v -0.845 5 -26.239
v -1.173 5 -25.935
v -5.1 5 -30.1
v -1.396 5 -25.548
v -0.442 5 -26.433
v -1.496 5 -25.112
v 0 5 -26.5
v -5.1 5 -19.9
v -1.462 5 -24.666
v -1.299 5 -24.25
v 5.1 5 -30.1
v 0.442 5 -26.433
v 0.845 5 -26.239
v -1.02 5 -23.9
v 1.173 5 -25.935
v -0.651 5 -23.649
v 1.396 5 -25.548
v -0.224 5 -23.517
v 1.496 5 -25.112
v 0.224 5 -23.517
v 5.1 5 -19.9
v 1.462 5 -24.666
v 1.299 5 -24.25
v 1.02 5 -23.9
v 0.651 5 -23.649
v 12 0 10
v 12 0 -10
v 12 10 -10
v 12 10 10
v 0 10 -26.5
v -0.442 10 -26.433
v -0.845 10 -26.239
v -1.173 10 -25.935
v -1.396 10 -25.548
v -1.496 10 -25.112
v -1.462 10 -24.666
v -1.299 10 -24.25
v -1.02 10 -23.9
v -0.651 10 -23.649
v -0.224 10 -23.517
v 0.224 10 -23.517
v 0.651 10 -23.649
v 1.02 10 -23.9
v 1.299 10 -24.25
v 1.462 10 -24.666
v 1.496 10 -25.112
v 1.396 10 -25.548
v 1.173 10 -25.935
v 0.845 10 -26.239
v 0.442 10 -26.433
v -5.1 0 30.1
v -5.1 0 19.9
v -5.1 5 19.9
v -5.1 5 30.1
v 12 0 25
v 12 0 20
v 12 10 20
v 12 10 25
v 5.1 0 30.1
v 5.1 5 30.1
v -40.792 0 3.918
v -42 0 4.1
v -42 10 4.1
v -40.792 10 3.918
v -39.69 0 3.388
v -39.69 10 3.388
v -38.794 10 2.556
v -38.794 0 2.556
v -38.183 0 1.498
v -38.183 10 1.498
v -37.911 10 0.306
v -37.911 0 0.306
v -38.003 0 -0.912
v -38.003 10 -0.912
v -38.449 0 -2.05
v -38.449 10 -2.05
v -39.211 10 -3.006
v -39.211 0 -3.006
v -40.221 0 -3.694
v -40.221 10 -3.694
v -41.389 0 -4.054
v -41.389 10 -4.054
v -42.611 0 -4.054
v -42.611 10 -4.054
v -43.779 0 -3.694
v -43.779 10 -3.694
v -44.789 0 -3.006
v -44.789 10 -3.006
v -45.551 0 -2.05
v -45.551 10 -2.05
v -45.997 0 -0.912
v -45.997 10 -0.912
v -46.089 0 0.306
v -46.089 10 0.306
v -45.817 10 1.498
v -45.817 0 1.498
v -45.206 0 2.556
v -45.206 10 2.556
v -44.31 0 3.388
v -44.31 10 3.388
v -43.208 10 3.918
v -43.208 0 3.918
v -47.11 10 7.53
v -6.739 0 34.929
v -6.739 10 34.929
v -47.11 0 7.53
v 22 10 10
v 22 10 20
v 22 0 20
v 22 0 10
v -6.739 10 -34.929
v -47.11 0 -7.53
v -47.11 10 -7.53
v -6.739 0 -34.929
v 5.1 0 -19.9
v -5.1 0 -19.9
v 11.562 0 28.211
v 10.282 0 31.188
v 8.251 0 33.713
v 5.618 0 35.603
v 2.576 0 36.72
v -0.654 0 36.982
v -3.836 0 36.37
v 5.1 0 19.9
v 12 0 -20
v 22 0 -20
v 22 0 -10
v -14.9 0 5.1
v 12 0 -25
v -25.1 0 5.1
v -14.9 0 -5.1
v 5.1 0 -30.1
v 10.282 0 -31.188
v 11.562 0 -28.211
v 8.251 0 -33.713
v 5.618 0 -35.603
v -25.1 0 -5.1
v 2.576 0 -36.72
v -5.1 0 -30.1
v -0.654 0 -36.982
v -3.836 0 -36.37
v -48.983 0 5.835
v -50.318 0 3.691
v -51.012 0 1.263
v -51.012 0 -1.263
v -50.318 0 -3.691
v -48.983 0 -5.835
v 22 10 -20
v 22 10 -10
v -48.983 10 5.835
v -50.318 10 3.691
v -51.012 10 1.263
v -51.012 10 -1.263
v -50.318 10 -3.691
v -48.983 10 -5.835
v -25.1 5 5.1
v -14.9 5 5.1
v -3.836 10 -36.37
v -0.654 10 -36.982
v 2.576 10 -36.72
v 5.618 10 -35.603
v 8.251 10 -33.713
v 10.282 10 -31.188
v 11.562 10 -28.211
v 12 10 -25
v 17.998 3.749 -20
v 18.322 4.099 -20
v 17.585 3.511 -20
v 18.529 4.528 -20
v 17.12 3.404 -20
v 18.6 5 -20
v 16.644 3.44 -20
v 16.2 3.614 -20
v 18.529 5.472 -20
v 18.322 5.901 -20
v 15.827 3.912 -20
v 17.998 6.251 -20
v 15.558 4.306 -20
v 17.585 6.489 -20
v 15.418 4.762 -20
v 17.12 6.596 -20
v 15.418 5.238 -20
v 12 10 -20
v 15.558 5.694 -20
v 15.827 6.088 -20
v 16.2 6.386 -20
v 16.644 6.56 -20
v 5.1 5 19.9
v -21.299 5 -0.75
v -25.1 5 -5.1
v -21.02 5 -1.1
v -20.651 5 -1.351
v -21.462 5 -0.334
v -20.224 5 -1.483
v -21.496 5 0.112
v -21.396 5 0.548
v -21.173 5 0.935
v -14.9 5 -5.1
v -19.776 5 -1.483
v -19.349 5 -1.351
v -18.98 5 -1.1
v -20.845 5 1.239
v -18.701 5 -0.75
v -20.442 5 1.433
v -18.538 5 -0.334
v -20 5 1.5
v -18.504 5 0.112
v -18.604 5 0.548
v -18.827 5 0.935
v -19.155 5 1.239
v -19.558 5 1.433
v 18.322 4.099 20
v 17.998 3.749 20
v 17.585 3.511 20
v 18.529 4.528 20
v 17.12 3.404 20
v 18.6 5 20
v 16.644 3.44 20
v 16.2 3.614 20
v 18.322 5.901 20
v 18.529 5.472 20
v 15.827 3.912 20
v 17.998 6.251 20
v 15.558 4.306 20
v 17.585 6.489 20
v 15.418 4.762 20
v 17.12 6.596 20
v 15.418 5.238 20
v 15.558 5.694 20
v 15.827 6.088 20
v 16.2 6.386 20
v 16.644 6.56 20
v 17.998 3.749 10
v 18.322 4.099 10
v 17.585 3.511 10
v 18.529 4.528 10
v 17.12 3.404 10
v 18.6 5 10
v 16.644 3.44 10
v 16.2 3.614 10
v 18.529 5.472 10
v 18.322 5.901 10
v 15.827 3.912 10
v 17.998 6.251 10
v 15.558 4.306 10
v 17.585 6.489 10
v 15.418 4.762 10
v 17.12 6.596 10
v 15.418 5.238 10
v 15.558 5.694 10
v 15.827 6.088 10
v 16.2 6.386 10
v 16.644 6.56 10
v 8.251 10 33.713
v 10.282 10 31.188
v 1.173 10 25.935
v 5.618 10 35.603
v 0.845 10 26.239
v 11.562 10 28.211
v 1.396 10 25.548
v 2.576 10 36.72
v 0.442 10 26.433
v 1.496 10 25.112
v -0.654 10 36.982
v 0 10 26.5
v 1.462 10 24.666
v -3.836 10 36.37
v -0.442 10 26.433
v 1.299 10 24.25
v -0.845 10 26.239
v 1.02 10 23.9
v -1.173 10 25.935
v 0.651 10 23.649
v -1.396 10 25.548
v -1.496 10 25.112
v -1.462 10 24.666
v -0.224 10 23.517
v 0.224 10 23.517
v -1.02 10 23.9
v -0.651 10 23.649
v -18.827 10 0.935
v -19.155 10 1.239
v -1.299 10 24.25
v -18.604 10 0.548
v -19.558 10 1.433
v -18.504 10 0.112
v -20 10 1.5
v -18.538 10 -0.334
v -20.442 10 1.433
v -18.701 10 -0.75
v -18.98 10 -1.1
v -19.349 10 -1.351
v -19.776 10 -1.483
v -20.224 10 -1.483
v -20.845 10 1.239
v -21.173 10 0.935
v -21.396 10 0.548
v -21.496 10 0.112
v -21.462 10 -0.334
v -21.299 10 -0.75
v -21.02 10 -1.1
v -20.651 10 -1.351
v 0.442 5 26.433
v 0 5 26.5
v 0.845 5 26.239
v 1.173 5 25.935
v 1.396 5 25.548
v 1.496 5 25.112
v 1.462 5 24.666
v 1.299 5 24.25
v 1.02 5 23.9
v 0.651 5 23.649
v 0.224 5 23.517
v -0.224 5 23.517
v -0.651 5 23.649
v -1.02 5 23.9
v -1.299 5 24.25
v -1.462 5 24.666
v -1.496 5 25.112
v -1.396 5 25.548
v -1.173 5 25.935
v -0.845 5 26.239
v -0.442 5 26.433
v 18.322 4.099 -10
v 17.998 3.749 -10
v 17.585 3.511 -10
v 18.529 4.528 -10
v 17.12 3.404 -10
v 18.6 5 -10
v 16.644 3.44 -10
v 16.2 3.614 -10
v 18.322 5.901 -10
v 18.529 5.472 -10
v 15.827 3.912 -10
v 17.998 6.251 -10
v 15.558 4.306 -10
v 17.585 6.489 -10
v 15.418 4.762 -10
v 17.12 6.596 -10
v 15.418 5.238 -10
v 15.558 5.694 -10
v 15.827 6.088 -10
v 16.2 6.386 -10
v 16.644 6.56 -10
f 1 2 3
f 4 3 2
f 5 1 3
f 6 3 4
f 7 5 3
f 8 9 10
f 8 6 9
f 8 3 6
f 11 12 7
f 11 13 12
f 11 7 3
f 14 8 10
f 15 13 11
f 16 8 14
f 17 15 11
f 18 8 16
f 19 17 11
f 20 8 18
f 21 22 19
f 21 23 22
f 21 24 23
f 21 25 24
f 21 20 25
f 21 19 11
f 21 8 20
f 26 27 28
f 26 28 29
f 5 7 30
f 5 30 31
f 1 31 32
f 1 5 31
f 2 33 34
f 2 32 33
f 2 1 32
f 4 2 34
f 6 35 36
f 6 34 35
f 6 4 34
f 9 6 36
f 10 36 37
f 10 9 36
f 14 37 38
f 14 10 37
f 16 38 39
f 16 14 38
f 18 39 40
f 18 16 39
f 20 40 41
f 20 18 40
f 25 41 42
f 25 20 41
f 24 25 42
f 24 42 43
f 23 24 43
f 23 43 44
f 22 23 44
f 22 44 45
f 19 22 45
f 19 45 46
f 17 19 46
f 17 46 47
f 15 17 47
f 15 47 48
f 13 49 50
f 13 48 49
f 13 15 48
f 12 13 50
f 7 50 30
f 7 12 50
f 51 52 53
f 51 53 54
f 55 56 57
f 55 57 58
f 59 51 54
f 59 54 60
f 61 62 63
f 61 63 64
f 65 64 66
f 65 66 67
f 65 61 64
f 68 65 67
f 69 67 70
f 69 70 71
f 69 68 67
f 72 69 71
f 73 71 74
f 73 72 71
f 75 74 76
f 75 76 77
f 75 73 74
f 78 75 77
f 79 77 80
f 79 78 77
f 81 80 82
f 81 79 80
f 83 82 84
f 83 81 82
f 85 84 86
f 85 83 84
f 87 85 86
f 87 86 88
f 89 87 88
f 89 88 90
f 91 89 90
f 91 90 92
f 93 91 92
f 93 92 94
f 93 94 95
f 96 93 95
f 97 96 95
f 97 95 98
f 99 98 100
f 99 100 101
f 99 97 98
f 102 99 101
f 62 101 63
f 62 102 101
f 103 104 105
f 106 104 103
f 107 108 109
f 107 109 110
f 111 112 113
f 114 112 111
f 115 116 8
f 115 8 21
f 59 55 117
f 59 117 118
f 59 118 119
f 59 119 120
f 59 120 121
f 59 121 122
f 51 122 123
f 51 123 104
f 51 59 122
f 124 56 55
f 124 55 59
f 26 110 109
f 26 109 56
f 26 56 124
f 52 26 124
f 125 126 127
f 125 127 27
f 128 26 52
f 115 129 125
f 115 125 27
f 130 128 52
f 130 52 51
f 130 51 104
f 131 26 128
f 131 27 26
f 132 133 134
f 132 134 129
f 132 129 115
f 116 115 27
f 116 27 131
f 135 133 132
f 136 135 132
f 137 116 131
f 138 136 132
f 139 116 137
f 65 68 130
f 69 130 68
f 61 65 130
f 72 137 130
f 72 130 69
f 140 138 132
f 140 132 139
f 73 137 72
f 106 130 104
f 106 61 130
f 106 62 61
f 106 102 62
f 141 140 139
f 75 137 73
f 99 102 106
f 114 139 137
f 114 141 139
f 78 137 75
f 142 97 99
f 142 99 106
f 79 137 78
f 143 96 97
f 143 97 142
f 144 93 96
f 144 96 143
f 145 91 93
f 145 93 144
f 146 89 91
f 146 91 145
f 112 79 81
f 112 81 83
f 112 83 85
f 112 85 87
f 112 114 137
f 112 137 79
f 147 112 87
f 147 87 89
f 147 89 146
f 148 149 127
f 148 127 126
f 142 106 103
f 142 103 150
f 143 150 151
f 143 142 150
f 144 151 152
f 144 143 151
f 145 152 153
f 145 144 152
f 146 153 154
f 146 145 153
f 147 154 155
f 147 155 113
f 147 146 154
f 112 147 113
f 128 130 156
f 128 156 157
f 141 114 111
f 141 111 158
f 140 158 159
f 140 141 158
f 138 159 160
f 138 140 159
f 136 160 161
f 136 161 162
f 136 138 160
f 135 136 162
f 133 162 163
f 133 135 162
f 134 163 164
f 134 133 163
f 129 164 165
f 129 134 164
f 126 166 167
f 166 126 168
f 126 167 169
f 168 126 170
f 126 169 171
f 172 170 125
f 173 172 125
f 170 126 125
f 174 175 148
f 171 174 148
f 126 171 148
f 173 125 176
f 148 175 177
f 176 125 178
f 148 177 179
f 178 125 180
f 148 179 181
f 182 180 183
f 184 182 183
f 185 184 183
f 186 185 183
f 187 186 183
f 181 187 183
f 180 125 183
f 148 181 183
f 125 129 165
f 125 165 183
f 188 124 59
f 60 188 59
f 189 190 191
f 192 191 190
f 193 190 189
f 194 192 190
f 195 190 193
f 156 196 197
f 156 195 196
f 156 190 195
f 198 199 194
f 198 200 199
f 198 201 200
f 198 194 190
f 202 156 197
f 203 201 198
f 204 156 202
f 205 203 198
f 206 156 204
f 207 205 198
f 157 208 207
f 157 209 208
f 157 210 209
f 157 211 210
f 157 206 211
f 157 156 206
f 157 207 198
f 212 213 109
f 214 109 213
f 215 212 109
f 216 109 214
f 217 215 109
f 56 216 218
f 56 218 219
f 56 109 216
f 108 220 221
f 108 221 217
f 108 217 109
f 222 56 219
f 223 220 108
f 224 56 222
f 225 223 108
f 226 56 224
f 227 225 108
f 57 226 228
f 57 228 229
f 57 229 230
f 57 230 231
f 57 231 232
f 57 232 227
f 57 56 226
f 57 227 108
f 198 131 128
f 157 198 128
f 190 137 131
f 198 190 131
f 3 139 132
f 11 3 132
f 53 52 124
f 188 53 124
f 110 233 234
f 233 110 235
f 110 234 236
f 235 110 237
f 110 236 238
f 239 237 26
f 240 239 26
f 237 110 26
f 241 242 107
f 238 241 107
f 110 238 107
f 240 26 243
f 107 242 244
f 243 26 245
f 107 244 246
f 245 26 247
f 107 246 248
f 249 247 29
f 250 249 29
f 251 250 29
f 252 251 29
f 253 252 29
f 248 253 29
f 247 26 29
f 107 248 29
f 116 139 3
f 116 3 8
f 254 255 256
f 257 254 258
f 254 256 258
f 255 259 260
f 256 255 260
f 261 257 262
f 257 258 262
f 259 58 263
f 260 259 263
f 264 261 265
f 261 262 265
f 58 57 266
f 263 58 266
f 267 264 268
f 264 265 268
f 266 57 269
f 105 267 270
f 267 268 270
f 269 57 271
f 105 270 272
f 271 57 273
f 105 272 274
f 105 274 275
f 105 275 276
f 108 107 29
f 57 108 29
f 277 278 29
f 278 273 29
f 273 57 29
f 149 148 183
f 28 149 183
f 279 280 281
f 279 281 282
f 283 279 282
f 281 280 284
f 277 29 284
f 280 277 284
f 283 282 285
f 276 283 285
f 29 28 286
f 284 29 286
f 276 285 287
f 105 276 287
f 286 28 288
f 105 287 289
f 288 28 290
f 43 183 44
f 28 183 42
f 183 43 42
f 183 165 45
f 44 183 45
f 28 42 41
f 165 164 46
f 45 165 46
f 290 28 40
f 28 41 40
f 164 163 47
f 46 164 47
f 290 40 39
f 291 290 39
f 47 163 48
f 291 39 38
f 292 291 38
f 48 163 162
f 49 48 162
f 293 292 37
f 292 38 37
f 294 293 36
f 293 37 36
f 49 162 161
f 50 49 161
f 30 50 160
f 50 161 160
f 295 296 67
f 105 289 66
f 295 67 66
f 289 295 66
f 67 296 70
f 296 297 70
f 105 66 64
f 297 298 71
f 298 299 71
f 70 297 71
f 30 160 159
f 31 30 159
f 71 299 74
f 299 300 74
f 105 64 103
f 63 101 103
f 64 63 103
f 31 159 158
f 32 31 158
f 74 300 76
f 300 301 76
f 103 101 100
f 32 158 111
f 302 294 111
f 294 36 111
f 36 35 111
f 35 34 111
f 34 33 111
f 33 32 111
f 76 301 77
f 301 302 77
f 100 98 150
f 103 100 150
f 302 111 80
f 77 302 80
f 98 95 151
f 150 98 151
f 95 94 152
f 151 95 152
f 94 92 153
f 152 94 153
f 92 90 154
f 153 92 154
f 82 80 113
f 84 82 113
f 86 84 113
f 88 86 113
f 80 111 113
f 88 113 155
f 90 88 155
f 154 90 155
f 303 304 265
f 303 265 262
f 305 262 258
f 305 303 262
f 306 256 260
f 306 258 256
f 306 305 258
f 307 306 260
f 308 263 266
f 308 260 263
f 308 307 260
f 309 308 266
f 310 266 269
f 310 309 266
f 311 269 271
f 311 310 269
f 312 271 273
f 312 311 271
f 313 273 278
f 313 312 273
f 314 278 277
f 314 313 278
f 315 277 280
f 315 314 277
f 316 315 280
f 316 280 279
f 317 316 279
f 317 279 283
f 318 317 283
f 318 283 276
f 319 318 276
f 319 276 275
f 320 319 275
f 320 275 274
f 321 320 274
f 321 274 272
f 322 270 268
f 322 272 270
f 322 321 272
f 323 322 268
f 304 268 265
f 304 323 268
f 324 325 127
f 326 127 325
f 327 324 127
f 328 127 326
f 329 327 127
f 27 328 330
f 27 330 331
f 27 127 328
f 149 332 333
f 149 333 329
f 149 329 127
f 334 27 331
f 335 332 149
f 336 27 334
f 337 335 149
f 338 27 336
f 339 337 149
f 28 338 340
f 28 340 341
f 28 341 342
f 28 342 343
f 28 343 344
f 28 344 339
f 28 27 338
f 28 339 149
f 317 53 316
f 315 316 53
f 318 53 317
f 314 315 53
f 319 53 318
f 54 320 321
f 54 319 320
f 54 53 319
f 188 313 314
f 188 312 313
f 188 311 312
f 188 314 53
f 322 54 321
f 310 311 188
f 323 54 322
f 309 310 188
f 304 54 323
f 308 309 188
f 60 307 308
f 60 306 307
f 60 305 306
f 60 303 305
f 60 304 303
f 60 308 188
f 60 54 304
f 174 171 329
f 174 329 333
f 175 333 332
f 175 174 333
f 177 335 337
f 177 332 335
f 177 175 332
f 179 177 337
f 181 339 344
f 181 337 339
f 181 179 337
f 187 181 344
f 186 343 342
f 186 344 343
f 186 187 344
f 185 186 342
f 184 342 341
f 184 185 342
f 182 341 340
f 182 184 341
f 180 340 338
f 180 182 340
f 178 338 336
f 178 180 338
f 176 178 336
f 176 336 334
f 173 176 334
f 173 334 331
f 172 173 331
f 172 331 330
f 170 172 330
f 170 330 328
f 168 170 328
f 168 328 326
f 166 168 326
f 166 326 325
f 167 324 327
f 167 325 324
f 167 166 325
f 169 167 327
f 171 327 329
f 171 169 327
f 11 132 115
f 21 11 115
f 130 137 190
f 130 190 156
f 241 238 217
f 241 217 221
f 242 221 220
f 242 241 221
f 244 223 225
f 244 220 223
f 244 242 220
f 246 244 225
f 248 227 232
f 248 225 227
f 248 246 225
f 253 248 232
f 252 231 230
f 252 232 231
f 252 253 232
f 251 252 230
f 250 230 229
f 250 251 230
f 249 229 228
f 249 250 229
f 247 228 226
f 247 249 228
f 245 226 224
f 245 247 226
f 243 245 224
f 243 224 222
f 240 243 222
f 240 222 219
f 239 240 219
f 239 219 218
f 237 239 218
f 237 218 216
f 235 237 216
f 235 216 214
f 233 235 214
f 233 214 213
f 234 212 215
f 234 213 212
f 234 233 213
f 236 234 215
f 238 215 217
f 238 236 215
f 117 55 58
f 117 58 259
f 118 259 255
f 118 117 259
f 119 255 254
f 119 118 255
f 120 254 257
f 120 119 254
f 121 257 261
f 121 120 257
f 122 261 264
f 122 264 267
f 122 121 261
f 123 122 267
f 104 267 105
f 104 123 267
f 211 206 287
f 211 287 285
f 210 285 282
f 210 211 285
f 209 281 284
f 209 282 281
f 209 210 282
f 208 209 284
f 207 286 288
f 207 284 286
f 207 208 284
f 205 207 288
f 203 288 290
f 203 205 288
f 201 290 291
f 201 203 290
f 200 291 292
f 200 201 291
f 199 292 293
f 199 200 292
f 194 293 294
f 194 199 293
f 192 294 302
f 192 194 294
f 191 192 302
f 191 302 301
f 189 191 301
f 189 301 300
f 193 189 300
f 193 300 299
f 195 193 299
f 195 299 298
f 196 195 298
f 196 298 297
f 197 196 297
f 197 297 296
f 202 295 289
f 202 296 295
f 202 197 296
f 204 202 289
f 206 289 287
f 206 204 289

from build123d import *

# Parameters (mm, degrees)
SKETCH_1_R               = 4.1
EXTRUDE_1_DEPTH          = 10
SKETCH_2_W               = 10.2
SKETCH_2_H               = 10.2
CUT_EXTRUDE_1_DEPTH      = 5
SKETCH_3_W               = 10
SKETCH_3_H               = 10
EXTRUDE_2_DEPTH          = 10
CUT_EXTRUDE_2_DEPTH      = 64.876521508
CUT_EXTRUDE_2_DEPTH_BACK = 64.876521508
SKETCH_4_R               = 1.6
SKETCH_5_R               = 1.5
CUT_EXTRUDE_3_DEPTH      = 64.876521508


with BuildPart() as part:
    # ｽｹｯﾁ1 → ﾎﾞｽ - 押し出し1 (new body)
    with BuildSketch(Plane(origin=(0, 0, 0), x_dir=(1, 0, 0), z_dir=(0, 1, 0))):
        with BuildLine():
            Line((-47.110254718, 7.529627927), (-6.738797431, 34.929179684))
            ThreePointArc((-6.738797431, 34.929179684), (5.618470914, 35.603432679), (12, 25))
            Line((12, 25), (12, -25))
            ThreePointArc((12, -25), (5.618470914, -35.603432679), (-6.738797431, -34.929179684))
            Line((-6.738797431, -34.929179684), (-47.110254718, -7.529627927))
            ThreePointArc((-47.110254718, -7.529627927), (-51.1, 0), (-47.110254718, 7.529627927))
        make_face()
        with Locations(Location((-42, 0, 0), (0, 0, 270))):
            Circle(SKETCH_1_R, mode=Mode.SUBTRACT)
    extrude(amount=EXTRUDE_1_DEPTH)

    # ｽｹｯﾁ2 → ｶｯﾄ - 押し出し1 (cut)
    with BuildSketch(Plane.XZ):
        with Locations((0, 25)):
            Rectangle(SKETCH_2_W, SKETCH_2_H)
        with Locations((0, -25)):
            Rectangle(SKETCH_2_W, SKETCH_2_H)
        with Locations((-20, 0)):
            Rectangle(SKETCH_2_W, SKETCH_2_H)
    extrude(amount=-CUT_EXTRUDE_1_DEPTH, mode=Mode.SUBTRACT)

    # ｽｹｯﾁ3 → ﾎﾞｽ - 押し出し2 (add)
    with BuildSketch(Plane(origin=(12, 0, 0), x_dir=(0, 0, -1), z_dir=(1, 0, 0))):
        with Locations((-15, 5)):
            Rectangle(SKETCH_3_W, SKETCH_3_H)
        with Locations((15, 5)):
            Rectangle(SKETCH_3_W, SKETCH_3_H)
    extrude(amount=EXTRUDE_2_DEPTH)

    # ｽｹｯﾁ4 → ｶｯﾄ - 押し出し2 (cut, two sides: drawn at the far end of the back side and taken through both)
    with BuildSketch(Plane.XY.offset(-CUT_EXTRUDE_2_DEPTH_BACK)):
        with Locations((17, 5)):
            Circle(SKETCH_4_R)
    extrude(amount=CUT_EXTRUDE_2_DEPTH + CUT_EXTRUDE_2_DEPTH_BACK, mode=Mode.SUBTRACT)

    # ｽｹｯﾁ5 → ｶｯﾄ - 押し出し3 (cut, through all)
    with BuildSketch(Plane(origin=(0, 0, 0), x_dir=(1, 0, 0), z_dir=(0, 1, 0))):
        with Locations(Location((0, -25, 0), (0, 0, 270))):
            Circle(SKETCH_5_R)
        with Locations(Location((-20, 0, 0), (0, 0, 270))):
            Circle(SKETCH_5_R)
        with Locations(Location((0, 25, 0), (0, 0, 90))):
            Circle(SKETCH_5_R)
    extrude(amount=CUT_EXTRUDE_3_DEPTH, mode=Mode.SUBTRACT)


solid = part.part
